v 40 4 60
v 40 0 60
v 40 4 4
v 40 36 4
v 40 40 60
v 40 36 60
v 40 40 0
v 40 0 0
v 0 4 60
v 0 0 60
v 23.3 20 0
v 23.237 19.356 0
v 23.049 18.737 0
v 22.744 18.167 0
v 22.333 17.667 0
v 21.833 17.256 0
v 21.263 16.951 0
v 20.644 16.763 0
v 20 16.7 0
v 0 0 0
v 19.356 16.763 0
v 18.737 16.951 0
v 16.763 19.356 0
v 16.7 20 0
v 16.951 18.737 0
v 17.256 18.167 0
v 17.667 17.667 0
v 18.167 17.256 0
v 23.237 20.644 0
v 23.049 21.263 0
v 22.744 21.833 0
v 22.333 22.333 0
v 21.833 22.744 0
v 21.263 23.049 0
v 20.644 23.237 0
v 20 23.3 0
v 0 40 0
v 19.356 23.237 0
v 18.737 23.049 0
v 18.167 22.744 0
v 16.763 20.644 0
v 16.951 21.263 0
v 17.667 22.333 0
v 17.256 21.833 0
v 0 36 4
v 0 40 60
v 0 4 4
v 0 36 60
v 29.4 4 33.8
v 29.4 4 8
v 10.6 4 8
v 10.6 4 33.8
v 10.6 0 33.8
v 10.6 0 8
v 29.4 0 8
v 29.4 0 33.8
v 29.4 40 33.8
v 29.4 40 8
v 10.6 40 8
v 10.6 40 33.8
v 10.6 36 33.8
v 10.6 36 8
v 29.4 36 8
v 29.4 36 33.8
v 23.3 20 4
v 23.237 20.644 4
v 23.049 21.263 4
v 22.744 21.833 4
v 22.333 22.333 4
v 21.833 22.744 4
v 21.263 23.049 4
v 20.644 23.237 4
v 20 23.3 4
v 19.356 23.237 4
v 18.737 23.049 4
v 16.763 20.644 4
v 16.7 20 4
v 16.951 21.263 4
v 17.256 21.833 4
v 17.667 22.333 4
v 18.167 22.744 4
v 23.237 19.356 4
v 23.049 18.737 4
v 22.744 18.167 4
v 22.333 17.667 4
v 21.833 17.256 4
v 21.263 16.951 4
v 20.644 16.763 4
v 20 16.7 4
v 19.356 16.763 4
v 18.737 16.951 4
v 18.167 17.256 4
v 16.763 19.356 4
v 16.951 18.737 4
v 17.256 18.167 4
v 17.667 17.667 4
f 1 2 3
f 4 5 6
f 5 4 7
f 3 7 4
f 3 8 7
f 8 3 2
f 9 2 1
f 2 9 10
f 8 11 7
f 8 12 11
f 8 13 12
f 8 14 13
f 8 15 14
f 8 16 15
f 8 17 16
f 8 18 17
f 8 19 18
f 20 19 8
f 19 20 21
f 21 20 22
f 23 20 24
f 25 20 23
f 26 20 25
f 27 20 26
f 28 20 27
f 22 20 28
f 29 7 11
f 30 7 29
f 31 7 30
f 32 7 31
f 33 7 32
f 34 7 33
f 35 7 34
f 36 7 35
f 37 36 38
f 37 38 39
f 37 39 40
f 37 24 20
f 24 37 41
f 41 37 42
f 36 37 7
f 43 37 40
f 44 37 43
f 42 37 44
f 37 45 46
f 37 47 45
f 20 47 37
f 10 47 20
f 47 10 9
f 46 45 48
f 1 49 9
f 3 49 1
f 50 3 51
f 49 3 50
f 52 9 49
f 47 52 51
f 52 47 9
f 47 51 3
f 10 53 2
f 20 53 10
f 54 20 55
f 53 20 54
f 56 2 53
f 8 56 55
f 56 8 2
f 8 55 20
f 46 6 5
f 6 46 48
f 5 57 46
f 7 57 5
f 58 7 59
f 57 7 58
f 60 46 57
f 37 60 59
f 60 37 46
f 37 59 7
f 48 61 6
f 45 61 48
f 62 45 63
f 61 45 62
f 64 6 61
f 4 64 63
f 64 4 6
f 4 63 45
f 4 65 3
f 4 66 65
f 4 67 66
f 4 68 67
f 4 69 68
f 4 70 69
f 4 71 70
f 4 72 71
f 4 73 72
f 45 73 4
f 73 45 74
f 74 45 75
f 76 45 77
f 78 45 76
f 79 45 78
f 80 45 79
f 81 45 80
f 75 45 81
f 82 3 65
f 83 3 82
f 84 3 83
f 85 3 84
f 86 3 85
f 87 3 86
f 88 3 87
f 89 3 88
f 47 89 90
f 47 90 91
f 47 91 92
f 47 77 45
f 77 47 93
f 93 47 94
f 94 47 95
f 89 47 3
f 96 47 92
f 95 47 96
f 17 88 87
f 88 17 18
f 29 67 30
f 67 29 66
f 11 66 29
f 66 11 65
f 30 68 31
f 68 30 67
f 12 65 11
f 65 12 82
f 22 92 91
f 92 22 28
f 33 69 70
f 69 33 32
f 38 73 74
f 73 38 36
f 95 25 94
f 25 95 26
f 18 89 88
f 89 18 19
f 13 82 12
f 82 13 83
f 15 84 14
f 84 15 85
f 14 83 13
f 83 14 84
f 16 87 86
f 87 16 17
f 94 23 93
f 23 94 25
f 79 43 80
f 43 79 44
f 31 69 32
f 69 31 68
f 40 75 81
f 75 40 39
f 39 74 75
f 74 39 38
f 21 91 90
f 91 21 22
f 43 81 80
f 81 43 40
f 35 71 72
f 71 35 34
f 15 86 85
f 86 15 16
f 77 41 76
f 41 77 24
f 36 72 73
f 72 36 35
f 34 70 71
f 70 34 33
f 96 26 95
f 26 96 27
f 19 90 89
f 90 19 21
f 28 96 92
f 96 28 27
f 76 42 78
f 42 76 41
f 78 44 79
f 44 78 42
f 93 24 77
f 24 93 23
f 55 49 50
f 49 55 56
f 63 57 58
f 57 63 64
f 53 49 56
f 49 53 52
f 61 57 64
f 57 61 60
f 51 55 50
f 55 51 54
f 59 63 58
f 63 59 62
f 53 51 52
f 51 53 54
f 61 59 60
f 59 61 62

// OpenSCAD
$fn = 32;

// ----------------------------------------------------------------------
// U-bracket: 40 x 40 x 60 mm
// ----------------------------------------------------------------------

// --- parameters (mm) ---
span = 40;                // outer length, X
outer_w = 40;             // outer width, Y
wall_h = 60;              // upright height, Z
plate_t = 4;              // wall thickness
hole_d = 6.6;             // clearance for M6
window_l = 18.8;          // window length
window_h = 25.8;          // window height

module hole_z(px, py) {
  translate([px, py, -0.5]) cylinder(h = plate_t + 1, d = hole_d);
}
module hole_y_pz(pz) {
  /* through both uprights along Y */
  translate([0, -0.5, pz]) rotate([-90, 0, 0]) cylinder(h = outer_w + 1, d = hole_d);
}

module base() {
  cube([span, outer_w, plate_t]);
}

module uprights() {
  cube([span, plate_t, wall_h]);
  translate([0, outer_w - plate_t, 0]) cube([span, plate_t, wall_h]);
}

difference() {
  union() {
    base();
    uprights();
  }
  hole_z(20, 20);
  /* lightening window through both uprights */
  translate([span / 2 - window_l / 2, -1, plate_t + 4])
    cube([window_l, outer_w + 2, window_h]);
}
